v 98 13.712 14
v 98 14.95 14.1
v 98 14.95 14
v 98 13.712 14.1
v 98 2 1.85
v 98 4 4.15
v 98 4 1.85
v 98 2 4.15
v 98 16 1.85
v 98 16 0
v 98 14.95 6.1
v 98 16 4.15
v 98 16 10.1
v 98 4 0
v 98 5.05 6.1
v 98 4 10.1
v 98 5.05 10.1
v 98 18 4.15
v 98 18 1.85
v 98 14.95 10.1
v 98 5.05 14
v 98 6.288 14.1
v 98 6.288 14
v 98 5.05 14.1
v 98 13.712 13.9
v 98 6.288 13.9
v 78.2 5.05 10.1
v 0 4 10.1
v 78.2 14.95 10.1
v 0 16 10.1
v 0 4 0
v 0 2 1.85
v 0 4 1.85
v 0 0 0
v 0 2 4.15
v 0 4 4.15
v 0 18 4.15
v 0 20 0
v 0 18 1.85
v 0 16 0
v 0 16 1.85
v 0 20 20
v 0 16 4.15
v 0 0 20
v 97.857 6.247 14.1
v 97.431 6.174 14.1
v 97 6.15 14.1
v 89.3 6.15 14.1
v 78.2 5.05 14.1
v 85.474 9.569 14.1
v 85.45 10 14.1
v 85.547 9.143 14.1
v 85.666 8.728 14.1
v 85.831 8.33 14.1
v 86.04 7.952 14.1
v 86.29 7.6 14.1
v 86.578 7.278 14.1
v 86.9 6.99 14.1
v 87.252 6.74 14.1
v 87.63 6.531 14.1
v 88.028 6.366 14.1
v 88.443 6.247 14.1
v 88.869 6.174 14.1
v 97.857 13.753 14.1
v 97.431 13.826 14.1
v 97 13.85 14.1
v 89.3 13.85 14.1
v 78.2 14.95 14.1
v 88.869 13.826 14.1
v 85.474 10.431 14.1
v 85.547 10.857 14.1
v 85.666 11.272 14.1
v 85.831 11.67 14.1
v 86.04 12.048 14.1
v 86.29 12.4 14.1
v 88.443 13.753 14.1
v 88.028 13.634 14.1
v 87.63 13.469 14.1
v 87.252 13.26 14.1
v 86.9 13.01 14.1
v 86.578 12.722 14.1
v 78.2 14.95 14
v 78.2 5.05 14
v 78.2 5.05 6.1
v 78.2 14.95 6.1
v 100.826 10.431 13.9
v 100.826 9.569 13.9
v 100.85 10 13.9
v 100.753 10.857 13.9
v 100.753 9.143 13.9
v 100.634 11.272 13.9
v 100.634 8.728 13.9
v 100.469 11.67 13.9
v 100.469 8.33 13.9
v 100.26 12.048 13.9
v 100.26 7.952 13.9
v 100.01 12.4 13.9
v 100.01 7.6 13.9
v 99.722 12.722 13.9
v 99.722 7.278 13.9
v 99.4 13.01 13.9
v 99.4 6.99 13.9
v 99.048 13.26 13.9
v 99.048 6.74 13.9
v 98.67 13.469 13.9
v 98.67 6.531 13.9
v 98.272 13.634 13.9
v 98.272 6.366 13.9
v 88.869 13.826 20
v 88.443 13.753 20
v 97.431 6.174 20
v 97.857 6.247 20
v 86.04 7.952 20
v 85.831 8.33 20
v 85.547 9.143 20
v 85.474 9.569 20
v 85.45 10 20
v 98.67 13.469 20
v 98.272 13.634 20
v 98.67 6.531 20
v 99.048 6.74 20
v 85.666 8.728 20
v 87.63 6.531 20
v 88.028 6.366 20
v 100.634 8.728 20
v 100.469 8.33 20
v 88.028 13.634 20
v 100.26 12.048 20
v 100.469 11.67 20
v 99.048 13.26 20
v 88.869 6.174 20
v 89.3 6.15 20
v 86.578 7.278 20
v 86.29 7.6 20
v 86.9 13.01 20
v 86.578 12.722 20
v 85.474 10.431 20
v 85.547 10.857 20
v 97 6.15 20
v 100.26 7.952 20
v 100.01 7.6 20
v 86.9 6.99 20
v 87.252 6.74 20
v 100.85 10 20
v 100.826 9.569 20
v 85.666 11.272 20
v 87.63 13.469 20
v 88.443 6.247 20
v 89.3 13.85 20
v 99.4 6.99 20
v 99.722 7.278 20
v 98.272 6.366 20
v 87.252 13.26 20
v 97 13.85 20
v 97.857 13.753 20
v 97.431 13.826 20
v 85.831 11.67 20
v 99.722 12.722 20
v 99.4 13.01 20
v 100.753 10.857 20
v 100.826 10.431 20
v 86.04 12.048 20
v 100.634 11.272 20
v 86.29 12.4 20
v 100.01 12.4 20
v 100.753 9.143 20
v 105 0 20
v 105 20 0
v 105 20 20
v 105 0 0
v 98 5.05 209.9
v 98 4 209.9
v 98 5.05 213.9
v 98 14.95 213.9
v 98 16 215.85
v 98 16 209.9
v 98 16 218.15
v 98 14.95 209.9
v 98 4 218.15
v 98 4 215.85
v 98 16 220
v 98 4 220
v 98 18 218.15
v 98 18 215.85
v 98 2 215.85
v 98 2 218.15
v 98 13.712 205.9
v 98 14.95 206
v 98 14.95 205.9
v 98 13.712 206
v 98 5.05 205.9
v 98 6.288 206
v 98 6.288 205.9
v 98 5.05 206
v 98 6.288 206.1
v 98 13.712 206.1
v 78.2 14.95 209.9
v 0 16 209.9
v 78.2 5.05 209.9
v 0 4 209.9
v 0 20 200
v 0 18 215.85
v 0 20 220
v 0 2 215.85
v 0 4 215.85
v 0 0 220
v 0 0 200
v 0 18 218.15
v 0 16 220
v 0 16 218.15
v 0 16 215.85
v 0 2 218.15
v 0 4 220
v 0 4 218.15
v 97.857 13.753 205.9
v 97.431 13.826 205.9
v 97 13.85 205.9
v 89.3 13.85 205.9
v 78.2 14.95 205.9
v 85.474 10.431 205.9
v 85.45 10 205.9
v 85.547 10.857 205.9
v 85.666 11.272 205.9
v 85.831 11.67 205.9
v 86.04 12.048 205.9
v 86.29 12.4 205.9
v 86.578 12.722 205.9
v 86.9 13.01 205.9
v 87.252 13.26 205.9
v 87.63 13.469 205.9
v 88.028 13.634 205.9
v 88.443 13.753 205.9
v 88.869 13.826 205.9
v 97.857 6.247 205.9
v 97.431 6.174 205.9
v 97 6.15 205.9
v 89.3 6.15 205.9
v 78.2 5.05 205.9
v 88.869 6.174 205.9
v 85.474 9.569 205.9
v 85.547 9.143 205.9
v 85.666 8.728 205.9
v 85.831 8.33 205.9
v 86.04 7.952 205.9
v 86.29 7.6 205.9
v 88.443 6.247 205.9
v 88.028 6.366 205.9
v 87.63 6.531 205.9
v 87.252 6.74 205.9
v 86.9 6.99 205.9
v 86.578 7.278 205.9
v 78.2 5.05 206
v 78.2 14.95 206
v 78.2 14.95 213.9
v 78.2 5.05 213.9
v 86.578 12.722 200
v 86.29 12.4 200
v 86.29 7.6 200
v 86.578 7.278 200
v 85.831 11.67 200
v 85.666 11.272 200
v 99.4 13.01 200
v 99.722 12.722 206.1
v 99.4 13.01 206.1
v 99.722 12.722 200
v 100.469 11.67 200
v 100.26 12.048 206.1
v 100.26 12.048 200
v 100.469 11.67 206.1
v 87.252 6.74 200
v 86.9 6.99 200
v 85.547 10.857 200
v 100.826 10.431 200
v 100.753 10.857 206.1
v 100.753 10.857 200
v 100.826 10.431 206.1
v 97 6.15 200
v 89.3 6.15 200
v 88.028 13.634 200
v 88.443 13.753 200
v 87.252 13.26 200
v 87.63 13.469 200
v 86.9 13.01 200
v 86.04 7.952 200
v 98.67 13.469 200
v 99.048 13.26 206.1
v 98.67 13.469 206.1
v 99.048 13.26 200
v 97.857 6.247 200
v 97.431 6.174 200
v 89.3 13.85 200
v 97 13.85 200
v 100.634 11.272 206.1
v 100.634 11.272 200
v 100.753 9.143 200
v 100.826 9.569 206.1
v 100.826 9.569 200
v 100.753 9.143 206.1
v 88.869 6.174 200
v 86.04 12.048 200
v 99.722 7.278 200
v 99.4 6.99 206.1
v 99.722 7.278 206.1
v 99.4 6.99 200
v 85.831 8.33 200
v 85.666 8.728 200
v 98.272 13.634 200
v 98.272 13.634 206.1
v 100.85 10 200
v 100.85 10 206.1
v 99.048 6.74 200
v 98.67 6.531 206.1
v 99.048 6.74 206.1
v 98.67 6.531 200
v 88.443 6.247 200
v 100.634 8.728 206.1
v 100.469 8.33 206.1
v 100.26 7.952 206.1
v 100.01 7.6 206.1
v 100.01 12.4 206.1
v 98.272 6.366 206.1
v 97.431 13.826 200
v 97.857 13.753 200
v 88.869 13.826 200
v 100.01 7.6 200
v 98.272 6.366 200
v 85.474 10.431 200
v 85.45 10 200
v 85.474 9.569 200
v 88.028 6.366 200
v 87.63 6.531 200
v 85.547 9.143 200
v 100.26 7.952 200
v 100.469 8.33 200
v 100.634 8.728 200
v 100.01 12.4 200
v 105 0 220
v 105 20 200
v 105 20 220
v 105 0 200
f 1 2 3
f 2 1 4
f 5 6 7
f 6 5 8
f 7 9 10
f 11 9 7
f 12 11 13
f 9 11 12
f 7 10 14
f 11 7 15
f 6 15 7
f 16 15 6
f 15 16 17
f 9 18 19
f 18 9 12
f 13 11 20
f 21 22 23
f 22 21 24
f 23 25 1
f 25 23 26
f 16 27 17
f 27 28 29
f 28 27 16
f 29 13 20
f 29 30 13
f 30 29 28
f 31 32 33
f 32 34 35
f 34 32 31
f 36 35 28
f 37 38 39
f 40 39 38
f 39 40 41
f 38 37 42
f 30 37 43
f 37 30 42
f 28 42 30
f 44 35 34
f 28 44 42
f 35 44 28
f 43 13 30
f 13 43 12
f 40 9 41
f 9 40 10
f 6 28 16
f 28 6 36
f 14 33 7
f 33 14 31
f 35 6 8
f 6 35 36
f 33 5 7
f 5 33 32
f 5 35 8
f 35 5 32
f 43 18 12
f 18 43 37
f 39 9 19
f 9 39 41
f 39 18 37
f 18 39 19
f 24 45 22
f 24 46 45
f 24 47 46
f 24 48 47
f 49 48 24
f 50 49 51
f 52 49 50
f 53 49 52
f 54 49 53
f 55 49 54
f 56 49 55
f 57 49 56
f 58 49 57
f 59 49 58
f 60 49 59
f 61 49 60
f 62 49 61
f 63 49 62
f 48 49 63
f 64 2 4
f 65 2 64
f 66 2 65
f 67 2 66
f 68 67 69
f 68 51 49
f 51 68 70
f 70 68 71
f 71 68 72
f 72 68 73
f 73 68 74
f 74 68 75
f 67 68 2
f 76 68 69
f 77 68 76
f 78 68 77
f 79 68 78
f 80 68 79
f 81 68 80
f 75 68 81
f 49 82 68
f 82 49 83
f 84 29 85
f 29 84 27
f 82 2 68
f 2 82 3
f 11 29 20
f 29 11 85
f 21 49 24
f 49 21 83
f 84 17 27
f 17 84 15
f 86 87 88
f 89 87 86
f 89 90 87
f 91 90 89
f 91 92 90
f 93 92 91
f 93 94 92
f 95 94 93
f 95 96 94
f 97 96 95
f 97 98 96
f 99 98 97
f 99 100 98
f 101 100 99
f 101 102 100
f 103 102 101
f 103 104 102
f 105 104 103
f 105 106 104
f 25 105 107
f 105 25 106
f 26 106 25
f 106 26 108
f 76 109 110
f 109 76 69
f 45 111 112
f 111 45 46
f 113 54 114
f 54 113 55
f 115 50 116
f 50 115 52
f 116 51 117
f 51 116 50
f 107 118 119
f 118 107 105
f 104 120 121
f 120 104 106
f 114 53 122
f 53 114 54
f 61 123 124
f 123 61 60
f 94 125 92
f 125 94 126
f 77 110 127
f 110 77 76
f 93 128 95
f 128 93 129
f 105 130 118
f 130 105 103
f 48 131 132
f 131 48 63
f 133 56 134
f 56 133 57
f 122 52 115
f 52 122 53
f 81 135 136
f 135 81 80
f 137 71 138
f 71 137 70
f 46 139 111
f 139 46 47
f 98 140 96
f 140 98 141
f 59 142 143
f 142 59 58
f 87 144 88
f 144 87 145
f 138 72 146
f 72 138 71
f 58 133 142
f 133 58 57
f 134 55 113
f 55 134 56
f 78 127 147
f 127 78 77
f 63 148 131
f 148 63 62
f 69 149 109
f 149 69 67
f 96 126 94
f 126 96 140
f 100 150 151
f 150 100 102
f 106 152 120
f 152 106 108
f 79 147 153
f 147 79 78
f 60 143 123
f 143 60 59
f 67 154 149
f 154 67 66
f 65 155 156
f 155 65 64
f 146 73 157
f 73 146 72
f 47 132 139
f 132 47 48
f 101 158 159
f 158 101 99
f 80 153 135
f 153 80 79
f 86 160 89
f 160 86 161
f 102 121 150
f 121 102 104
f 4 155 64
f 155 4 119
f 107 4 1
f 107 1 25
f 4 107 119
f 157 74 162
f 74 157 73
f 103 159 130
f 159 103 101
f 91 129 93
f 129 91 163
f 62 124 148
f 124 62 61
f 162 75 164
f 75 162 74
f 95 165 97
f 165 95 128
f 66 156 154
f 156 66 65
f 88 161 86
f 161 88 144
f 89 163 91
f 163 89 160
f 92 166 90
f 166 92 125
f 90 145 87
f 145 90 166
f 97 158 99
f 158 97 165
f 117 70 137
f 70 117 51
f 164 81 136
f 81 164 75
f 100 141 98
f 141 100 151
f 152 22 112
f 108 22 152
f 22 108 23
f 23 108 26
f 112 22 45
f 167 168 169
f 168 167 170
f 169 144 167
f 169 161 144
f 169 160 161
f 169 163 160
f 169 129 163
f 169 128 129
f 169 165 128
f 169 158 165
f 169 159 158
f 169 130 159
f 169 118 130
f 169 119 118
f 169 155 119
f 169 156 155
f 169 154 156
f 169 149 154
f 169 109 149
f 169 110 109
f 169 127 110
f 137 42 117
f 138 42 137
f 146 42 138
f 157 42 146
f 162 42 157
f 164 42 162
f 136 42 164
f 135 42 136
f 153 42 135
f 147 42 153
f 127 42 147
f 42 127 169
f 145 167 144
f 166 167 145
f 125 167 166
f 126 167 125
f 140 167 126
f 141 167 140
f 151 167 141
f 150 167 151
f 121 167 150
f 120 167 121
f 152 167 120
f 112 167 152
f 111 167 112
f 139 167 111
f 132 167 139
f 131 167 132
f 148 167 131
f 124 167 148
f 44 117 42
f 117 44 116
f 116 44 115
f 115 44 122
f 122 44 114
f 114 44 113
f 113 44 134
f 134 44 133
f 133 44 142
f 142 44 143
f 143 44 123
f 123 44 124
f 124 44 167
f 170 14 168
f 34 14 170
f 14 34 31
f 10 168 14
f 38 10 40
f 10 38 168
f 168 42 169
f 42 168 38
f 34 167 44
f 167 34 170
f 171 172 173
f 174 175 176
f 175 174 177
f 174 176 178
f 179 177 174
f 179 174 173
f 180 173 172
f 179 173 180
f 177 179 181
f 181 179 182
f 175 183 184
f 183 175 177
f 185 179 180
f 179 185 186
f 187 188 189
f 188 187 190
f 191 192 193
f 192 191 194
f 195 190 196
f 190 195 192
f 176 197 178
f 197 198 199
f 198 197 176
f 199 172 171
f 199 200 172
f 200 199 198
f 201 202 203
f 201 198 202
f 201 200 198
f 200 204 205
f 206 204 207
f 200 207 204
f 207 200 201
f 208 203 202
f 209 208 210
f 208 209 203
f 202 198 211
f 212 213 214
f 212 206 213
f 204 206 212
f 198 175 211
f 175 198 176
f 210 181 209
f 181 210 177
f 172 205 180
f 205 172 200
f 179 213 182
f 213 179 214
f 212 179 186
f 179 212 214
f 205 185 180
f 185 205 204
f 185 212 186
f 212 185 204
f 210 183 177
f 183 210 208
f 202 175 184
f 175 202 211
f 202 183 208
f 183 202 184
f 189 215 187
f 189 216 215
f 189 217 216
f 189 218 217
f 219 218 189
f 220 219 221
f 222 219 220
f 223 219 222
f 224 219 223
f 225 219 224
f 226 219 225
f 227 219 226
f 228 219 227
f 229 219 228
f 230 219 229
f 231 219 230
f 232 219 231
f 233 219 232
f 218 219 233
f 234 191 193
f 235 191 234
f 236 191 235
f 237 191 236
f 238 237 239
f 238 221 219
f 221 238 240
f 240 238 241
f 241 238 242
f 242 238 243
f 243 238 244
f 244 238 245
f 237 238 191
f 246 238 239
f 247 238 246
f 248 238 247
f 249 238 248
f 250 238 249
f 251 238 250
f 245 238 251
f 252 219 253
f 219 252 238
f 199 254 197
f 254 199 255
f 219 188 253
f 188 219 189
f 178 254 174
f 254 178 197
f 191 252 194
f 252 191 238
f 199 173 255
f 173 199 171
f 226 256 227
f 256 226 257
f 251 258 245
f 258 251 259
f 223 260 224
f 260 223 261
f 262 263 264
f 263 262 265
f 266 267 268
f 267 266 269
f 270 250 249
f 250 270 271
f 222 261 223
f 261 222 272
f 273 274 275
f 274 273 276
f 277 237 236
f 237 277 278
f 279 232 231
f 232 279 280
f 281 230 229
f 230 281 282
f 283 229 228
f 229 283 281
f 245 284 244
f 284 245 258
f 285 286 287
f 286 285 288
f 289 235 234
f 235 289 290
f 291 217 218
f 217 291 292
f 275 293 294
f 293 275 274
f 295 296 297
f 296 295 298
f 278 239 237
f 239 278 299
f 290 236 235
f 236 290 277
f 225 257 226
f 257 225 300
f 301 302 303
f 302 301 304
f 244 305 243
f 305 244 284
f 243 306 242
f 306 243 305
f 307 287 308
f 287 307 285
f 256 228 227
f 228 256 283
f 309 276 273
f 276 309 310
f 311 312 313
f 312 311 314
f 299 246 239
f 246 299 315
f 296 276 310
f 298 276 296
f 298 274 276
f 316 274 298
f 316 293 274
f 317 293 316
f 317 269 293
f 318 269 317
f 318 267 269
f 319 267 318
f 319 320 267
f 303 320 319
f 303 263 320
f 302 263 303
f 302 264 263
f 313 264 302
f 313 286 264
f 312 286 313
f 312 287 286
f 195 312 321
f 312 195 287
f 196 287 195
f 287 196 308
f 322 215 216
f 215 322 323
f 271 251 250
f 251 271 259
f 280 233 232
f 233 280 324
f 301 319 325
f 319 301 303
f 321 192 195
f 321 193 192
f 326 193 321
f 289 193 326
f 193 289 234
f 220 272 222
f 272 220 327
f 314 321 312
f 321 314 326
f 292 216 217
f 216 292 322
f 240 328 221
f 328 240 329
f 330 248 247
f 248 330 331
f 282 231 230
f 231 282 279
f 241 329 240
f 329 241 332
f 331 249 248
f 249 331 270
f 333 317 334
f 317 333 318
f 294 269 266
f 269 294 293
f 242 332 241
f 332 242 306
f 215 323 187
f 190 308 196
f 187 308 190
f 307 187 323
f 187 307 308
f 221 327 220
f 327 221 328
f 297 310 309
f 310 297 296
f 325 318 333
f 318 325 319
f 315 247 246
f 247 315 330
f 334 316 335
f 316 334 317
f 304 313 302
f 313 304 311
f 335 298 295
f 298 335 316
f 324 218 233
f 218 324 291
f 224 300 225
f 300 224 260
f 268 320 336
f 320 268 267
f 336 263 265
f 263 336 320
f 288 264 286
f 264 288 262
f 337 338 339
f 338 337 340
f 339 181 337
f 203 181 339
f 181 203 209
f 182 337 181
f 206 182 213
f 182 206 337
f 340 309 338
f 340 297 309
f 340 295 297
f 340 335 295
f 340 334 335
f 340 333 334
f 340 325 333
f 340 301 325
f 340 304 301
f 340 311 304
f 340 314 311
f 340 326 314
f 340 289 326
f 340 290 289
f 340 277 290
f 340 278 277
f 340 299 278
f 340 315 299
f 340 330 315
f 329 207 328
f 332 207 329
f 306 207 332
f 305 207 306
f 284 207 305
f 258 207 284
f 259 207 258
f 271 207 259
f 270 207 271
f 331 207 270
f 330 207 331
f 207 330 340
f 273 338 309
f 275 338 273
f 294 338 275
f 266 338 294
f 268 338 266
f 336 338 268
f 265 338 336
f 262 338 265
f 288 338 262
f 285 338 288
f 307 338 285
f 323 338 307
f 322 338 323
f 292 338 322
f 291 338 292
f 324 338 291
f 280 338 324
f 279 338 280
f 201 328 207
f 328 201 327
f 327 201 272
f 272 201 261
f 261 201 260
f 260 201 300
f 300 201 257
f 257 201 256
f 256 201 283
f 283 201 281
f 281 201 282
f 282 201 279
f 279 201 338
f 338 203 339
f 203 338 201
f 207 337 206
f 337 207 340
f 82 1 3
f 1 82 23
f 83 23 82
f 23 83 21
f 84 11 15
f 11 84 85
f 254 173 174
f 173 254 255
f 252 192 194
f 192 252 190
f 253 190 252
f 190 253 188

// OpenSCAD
/* Break-beam sensor holder — recessed cable channel with sliding cover.
   The gray area in the sketch: 6 mm cable channel.
   The sensor pocket within it: another 4 mm (10 mm total from the outer face).
*/
$fn=56;
piece="outer_open"; // assembly | inner_view | outer_open | cover

arm=105; profile=20; gap=180;
sensor_l=19.8; sensor_w=9.9; sensor_h=7.9;
channel_depth=10; sensor_extra_depth=4; optic_d=7.7;
optic_slot_len=2*optic_d;
channel_w=16;                    // 2 mm margin on both sides of the 20 mm profile
optic_x=arm-8; optic_y=profile/2;
// Sensor pocket ends 7 mm before the arm tip; the optical channel is 8 mm before it.
// This leaves the outer tip as a solid, uninterrupted 7 mm bridge.
sensor_x0=arm-sensor_l-7;
channel_end=arm-7; // Cable channel and cover end before the solid arm end.
cover_travel=12;  // Free travel at the channel end towards the control board.
cover_length=channel_end-cover_travel;

// 6 mm cable channel from outside, plus a 4 mm deeper sensor pocket.
module outer_cuts(z,upper=true) {
  if(upper) {
    // Deep 10 mm trough in the middle. The upper lip AND lower support remain
    // on both sides; together they form the closed C-groove.
    translate([0,4,z+profile-channel_depth-.1]) cube([channel_end,12,channel_depth+.2]);
    translate([0,2,z+profile-4.15]) cube([channel_end,2,2.3]);
    translate([0,16,z+profile-4.15]) cube([channel_end,2,2.3]);
    translate([sensor_x0,(profile-sensor_w)/2,z+profile-channel_depth-sensor_extra_depth-.1])
      cube([sensor_l,sensor_w,channel_depth+sensor_extra_depth+.2]);
    // Optical path from the inner U face to the recessed sensor lens.
    hull() {
      translate([optic_x,optic_y,z-.1]) cylinder(d=optic_d,h=profile-channel_depth-sensor_extra_depth+.2);
      translate([optic_x-(optic_slot_len-optic_d),optic_y,z-.1])
        cylinder(d=optic_d,h=profile-channel_depth-sensor_extra_depth+.2);
    }
  } else {
    translate([0,4,z-.1]) cube([channel_end,12,channel_depth+.2]);
    translate([0,2,z+1.85]) cube([channel_end,2,2.3]);
    translate([0,16,z+1.85]) cube([channel_end,2,2.3]);
    translate([sensor_x0,(profile-sensor_w)/2,z-.1])
      cube([sensor_l,sensor_w,channel_depth+sensor_extra_depth+.2]);
    hull() {
      translate([optic_x,optic_y,z+channel_depth+sensor_extra_depth-.1])
        cylinder(d=optic_d,h=profile-channel_depth-sensor_extra_depth+.2);
      translate([optic_x-(optic_slot_len-optic_d),optic_y,z+channel_depth+sensor_extra_depth-.1])
        cylinder(d=optic_d,h=profile-channel_depth-sensor_extra_depth+.2);
    }
  }
}

module arm_body(z,upper=true) {
  difference() {
    translate([0,0,z]) cube([arm,profile,profile]);
    outer_cuts(z,upper);
  }
}

// 2 mm cover in the C-profile: 2 mm below the outer face, with side edges
// beneath the lips. It is 12 mm shorter than the channel, allowing it to slide.
module slider_cover(z,upper=true,xpos=0) {
  if(upper) {
    // 0.15 mm clearance to the upper and lower C-groove guides.
    translate([xpos,2.15,z+profile-4.0]) cube([cover_length,15.7,2]);
  } else {
    translate([xpos,2.15,z+2.0]) cube([cover_length,15.7,2]);
  }
}

// Visual check only — the actual sensor half is concealed by the cover.
module sensor_mock(z,upper=true) {
  if(upper)
    translate([sensor_x0,(profile-sensor_w)/2,z+profile-channel_depth-sensor_extra_depth])
      cube([sensor_l,sensor_w,sensor_h]);
  else
    translate([sensor_x0,(profile-sensor_w)/2,z+channel_depth+sensor_extra_depth-sensor_h])
      cube([sensor_l,sensor_w,sensor_h]);
}

module complete() {
  arm_body(0,false);
  arm_body(gap+profile,true);
  // Closed position: cover pushed to sensor pocket, 12 mm travel remains free at the rear.
  slider_cover(0,false,cover_travel);
  slider_cover(gap+profile,true,cover_travel);
}

if(piece=="assembly") complete();
if(piece=="inner_view") { arm_body(0,false); arm_body(gap+profile,true); }
if(piece=="outer_open") { arm_body(0,false); arm_body(gap+profile,true); color("dimgray") sensor_mock(0,false); color("dimgray") sensor_mock(gap+profile,true); }
if(piece=="cover") { slider_cover(0,false); translate([0,22,0]) slider_cover(0,true); }
